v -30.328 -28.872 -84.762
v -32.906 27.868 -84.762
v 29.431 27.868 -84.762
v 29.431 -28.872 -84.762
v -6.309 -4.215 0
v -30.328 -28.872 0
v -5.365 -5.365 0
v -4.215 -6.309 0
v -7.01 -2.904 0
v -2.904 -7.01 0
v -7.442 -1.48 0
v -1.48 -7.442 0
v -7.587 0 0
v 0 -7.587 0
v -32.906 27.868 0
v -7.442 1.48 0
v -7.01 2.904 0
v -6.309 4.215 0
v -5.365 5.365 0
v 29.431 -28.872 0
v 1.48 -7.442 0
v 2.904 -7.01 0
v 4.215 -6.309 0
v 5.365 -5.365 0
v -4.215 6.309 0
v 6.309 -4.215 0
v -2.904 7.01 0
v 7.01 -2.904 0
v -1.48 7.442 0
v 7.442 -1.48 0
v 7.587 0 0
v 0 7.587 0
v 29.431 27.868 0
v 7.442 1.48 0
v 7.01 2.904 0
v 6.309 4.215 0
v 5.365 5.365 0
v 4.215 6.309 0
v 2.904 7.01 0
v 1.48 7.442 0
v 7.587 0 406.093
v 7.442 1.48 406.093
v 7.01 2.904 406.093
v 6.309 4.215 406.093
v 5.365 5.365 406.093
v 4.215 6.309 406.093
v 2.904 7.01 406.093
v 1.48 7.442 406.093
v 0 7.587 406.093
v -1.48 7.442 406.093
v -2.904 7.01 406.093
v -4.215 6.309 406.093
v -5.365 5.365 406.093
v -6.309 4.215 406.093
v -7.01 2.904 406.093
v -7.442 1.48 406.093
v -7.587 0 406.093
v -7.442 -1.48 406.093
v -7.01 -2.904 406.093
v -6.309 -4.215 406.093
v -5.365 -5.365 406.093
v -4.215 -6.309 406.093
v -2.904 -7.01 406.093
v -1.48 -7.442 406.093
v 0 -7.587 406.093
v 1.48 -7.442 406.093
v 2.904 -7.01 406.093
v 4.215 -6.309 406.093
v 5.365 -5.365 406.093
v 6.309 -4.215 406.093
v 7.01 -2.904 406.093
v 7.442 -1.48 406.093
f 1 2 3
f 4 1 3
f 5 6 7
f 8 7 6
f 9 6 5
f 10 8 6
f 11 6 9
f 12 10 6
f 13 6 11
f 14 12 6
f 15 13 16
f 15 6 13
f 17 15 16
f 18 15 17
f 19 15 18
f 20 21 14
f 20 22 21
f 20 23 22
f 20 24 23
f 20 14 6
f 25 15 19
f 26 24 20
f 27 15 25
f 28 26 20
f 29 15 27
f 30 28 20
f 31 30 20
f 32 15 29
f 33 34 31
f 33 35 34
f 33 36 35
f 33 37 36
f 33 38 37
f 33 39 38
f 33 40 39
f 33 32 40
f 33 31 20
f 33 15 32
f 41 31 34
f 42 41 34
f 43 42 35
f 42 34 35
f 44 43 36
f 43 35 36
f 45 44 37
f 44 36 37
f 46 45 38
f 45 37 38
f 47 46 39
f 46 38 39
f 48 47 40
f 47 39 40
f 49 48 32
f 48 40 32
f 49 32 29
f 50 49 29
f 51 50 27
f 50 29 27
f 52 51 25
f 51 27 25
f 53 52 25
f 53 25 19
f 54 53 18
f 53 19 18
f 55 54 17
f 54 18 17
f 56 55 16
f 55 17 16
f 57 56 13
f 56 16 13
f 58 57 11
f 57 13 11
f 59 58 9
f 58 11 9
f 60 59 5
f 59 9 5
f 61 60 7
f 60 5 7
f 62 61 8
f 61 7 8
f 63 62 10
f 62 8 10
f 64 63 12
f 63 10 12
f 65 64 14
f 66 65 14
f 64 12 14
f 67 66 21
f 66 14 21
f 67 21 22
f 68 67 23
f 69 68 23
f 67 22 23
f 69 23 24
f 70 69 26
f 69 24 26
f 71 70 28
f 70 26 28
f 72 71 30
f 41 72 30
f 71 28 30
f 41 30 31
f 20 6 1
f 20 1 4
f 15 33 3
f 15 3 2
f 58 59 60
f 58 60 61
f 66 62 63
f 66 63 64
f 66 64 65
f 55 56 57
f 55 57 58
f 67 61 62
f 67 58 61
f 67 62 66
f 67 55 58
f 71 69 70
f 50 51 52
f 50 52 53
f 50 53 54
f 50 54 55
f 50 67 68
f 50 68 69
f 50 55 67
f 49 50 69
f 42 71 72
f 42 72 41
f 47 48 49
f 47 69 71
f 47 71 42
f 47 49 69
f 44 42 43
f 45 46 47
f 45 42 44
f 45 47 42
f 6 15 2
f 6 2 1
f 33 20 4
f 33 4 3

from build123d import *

# Parameters (mm, degrees)
F1_DEPTH = 84.7620591521
F2_R     = 7.5874829839
F3_DEPTH = 406.0934484005


# Not quite as in the source:
# - the program builds the solid bodies; features that only make, move or delete a surface that nothing else refers to are left out


with BuildPart() as f1:
    # F0 (on Top) → F1 (new body)
    with BuildSketch(Plane.XY):
        Polygon((29.4313300401, 27.8682895005), (-32.9063385725, 27.8682895005), (-30.3279589862, -28.8718193769), (29.4313300401, -28.8718193769), align=None)
    extrude(amount=-F1_DEPTH)

    # F2 (on Top) → F3 (join)
    with BuildSketch(Plane.XY):
        Circle(F2_R)
    extrude(amount=F3_DEPTH)


solid = f1.part
